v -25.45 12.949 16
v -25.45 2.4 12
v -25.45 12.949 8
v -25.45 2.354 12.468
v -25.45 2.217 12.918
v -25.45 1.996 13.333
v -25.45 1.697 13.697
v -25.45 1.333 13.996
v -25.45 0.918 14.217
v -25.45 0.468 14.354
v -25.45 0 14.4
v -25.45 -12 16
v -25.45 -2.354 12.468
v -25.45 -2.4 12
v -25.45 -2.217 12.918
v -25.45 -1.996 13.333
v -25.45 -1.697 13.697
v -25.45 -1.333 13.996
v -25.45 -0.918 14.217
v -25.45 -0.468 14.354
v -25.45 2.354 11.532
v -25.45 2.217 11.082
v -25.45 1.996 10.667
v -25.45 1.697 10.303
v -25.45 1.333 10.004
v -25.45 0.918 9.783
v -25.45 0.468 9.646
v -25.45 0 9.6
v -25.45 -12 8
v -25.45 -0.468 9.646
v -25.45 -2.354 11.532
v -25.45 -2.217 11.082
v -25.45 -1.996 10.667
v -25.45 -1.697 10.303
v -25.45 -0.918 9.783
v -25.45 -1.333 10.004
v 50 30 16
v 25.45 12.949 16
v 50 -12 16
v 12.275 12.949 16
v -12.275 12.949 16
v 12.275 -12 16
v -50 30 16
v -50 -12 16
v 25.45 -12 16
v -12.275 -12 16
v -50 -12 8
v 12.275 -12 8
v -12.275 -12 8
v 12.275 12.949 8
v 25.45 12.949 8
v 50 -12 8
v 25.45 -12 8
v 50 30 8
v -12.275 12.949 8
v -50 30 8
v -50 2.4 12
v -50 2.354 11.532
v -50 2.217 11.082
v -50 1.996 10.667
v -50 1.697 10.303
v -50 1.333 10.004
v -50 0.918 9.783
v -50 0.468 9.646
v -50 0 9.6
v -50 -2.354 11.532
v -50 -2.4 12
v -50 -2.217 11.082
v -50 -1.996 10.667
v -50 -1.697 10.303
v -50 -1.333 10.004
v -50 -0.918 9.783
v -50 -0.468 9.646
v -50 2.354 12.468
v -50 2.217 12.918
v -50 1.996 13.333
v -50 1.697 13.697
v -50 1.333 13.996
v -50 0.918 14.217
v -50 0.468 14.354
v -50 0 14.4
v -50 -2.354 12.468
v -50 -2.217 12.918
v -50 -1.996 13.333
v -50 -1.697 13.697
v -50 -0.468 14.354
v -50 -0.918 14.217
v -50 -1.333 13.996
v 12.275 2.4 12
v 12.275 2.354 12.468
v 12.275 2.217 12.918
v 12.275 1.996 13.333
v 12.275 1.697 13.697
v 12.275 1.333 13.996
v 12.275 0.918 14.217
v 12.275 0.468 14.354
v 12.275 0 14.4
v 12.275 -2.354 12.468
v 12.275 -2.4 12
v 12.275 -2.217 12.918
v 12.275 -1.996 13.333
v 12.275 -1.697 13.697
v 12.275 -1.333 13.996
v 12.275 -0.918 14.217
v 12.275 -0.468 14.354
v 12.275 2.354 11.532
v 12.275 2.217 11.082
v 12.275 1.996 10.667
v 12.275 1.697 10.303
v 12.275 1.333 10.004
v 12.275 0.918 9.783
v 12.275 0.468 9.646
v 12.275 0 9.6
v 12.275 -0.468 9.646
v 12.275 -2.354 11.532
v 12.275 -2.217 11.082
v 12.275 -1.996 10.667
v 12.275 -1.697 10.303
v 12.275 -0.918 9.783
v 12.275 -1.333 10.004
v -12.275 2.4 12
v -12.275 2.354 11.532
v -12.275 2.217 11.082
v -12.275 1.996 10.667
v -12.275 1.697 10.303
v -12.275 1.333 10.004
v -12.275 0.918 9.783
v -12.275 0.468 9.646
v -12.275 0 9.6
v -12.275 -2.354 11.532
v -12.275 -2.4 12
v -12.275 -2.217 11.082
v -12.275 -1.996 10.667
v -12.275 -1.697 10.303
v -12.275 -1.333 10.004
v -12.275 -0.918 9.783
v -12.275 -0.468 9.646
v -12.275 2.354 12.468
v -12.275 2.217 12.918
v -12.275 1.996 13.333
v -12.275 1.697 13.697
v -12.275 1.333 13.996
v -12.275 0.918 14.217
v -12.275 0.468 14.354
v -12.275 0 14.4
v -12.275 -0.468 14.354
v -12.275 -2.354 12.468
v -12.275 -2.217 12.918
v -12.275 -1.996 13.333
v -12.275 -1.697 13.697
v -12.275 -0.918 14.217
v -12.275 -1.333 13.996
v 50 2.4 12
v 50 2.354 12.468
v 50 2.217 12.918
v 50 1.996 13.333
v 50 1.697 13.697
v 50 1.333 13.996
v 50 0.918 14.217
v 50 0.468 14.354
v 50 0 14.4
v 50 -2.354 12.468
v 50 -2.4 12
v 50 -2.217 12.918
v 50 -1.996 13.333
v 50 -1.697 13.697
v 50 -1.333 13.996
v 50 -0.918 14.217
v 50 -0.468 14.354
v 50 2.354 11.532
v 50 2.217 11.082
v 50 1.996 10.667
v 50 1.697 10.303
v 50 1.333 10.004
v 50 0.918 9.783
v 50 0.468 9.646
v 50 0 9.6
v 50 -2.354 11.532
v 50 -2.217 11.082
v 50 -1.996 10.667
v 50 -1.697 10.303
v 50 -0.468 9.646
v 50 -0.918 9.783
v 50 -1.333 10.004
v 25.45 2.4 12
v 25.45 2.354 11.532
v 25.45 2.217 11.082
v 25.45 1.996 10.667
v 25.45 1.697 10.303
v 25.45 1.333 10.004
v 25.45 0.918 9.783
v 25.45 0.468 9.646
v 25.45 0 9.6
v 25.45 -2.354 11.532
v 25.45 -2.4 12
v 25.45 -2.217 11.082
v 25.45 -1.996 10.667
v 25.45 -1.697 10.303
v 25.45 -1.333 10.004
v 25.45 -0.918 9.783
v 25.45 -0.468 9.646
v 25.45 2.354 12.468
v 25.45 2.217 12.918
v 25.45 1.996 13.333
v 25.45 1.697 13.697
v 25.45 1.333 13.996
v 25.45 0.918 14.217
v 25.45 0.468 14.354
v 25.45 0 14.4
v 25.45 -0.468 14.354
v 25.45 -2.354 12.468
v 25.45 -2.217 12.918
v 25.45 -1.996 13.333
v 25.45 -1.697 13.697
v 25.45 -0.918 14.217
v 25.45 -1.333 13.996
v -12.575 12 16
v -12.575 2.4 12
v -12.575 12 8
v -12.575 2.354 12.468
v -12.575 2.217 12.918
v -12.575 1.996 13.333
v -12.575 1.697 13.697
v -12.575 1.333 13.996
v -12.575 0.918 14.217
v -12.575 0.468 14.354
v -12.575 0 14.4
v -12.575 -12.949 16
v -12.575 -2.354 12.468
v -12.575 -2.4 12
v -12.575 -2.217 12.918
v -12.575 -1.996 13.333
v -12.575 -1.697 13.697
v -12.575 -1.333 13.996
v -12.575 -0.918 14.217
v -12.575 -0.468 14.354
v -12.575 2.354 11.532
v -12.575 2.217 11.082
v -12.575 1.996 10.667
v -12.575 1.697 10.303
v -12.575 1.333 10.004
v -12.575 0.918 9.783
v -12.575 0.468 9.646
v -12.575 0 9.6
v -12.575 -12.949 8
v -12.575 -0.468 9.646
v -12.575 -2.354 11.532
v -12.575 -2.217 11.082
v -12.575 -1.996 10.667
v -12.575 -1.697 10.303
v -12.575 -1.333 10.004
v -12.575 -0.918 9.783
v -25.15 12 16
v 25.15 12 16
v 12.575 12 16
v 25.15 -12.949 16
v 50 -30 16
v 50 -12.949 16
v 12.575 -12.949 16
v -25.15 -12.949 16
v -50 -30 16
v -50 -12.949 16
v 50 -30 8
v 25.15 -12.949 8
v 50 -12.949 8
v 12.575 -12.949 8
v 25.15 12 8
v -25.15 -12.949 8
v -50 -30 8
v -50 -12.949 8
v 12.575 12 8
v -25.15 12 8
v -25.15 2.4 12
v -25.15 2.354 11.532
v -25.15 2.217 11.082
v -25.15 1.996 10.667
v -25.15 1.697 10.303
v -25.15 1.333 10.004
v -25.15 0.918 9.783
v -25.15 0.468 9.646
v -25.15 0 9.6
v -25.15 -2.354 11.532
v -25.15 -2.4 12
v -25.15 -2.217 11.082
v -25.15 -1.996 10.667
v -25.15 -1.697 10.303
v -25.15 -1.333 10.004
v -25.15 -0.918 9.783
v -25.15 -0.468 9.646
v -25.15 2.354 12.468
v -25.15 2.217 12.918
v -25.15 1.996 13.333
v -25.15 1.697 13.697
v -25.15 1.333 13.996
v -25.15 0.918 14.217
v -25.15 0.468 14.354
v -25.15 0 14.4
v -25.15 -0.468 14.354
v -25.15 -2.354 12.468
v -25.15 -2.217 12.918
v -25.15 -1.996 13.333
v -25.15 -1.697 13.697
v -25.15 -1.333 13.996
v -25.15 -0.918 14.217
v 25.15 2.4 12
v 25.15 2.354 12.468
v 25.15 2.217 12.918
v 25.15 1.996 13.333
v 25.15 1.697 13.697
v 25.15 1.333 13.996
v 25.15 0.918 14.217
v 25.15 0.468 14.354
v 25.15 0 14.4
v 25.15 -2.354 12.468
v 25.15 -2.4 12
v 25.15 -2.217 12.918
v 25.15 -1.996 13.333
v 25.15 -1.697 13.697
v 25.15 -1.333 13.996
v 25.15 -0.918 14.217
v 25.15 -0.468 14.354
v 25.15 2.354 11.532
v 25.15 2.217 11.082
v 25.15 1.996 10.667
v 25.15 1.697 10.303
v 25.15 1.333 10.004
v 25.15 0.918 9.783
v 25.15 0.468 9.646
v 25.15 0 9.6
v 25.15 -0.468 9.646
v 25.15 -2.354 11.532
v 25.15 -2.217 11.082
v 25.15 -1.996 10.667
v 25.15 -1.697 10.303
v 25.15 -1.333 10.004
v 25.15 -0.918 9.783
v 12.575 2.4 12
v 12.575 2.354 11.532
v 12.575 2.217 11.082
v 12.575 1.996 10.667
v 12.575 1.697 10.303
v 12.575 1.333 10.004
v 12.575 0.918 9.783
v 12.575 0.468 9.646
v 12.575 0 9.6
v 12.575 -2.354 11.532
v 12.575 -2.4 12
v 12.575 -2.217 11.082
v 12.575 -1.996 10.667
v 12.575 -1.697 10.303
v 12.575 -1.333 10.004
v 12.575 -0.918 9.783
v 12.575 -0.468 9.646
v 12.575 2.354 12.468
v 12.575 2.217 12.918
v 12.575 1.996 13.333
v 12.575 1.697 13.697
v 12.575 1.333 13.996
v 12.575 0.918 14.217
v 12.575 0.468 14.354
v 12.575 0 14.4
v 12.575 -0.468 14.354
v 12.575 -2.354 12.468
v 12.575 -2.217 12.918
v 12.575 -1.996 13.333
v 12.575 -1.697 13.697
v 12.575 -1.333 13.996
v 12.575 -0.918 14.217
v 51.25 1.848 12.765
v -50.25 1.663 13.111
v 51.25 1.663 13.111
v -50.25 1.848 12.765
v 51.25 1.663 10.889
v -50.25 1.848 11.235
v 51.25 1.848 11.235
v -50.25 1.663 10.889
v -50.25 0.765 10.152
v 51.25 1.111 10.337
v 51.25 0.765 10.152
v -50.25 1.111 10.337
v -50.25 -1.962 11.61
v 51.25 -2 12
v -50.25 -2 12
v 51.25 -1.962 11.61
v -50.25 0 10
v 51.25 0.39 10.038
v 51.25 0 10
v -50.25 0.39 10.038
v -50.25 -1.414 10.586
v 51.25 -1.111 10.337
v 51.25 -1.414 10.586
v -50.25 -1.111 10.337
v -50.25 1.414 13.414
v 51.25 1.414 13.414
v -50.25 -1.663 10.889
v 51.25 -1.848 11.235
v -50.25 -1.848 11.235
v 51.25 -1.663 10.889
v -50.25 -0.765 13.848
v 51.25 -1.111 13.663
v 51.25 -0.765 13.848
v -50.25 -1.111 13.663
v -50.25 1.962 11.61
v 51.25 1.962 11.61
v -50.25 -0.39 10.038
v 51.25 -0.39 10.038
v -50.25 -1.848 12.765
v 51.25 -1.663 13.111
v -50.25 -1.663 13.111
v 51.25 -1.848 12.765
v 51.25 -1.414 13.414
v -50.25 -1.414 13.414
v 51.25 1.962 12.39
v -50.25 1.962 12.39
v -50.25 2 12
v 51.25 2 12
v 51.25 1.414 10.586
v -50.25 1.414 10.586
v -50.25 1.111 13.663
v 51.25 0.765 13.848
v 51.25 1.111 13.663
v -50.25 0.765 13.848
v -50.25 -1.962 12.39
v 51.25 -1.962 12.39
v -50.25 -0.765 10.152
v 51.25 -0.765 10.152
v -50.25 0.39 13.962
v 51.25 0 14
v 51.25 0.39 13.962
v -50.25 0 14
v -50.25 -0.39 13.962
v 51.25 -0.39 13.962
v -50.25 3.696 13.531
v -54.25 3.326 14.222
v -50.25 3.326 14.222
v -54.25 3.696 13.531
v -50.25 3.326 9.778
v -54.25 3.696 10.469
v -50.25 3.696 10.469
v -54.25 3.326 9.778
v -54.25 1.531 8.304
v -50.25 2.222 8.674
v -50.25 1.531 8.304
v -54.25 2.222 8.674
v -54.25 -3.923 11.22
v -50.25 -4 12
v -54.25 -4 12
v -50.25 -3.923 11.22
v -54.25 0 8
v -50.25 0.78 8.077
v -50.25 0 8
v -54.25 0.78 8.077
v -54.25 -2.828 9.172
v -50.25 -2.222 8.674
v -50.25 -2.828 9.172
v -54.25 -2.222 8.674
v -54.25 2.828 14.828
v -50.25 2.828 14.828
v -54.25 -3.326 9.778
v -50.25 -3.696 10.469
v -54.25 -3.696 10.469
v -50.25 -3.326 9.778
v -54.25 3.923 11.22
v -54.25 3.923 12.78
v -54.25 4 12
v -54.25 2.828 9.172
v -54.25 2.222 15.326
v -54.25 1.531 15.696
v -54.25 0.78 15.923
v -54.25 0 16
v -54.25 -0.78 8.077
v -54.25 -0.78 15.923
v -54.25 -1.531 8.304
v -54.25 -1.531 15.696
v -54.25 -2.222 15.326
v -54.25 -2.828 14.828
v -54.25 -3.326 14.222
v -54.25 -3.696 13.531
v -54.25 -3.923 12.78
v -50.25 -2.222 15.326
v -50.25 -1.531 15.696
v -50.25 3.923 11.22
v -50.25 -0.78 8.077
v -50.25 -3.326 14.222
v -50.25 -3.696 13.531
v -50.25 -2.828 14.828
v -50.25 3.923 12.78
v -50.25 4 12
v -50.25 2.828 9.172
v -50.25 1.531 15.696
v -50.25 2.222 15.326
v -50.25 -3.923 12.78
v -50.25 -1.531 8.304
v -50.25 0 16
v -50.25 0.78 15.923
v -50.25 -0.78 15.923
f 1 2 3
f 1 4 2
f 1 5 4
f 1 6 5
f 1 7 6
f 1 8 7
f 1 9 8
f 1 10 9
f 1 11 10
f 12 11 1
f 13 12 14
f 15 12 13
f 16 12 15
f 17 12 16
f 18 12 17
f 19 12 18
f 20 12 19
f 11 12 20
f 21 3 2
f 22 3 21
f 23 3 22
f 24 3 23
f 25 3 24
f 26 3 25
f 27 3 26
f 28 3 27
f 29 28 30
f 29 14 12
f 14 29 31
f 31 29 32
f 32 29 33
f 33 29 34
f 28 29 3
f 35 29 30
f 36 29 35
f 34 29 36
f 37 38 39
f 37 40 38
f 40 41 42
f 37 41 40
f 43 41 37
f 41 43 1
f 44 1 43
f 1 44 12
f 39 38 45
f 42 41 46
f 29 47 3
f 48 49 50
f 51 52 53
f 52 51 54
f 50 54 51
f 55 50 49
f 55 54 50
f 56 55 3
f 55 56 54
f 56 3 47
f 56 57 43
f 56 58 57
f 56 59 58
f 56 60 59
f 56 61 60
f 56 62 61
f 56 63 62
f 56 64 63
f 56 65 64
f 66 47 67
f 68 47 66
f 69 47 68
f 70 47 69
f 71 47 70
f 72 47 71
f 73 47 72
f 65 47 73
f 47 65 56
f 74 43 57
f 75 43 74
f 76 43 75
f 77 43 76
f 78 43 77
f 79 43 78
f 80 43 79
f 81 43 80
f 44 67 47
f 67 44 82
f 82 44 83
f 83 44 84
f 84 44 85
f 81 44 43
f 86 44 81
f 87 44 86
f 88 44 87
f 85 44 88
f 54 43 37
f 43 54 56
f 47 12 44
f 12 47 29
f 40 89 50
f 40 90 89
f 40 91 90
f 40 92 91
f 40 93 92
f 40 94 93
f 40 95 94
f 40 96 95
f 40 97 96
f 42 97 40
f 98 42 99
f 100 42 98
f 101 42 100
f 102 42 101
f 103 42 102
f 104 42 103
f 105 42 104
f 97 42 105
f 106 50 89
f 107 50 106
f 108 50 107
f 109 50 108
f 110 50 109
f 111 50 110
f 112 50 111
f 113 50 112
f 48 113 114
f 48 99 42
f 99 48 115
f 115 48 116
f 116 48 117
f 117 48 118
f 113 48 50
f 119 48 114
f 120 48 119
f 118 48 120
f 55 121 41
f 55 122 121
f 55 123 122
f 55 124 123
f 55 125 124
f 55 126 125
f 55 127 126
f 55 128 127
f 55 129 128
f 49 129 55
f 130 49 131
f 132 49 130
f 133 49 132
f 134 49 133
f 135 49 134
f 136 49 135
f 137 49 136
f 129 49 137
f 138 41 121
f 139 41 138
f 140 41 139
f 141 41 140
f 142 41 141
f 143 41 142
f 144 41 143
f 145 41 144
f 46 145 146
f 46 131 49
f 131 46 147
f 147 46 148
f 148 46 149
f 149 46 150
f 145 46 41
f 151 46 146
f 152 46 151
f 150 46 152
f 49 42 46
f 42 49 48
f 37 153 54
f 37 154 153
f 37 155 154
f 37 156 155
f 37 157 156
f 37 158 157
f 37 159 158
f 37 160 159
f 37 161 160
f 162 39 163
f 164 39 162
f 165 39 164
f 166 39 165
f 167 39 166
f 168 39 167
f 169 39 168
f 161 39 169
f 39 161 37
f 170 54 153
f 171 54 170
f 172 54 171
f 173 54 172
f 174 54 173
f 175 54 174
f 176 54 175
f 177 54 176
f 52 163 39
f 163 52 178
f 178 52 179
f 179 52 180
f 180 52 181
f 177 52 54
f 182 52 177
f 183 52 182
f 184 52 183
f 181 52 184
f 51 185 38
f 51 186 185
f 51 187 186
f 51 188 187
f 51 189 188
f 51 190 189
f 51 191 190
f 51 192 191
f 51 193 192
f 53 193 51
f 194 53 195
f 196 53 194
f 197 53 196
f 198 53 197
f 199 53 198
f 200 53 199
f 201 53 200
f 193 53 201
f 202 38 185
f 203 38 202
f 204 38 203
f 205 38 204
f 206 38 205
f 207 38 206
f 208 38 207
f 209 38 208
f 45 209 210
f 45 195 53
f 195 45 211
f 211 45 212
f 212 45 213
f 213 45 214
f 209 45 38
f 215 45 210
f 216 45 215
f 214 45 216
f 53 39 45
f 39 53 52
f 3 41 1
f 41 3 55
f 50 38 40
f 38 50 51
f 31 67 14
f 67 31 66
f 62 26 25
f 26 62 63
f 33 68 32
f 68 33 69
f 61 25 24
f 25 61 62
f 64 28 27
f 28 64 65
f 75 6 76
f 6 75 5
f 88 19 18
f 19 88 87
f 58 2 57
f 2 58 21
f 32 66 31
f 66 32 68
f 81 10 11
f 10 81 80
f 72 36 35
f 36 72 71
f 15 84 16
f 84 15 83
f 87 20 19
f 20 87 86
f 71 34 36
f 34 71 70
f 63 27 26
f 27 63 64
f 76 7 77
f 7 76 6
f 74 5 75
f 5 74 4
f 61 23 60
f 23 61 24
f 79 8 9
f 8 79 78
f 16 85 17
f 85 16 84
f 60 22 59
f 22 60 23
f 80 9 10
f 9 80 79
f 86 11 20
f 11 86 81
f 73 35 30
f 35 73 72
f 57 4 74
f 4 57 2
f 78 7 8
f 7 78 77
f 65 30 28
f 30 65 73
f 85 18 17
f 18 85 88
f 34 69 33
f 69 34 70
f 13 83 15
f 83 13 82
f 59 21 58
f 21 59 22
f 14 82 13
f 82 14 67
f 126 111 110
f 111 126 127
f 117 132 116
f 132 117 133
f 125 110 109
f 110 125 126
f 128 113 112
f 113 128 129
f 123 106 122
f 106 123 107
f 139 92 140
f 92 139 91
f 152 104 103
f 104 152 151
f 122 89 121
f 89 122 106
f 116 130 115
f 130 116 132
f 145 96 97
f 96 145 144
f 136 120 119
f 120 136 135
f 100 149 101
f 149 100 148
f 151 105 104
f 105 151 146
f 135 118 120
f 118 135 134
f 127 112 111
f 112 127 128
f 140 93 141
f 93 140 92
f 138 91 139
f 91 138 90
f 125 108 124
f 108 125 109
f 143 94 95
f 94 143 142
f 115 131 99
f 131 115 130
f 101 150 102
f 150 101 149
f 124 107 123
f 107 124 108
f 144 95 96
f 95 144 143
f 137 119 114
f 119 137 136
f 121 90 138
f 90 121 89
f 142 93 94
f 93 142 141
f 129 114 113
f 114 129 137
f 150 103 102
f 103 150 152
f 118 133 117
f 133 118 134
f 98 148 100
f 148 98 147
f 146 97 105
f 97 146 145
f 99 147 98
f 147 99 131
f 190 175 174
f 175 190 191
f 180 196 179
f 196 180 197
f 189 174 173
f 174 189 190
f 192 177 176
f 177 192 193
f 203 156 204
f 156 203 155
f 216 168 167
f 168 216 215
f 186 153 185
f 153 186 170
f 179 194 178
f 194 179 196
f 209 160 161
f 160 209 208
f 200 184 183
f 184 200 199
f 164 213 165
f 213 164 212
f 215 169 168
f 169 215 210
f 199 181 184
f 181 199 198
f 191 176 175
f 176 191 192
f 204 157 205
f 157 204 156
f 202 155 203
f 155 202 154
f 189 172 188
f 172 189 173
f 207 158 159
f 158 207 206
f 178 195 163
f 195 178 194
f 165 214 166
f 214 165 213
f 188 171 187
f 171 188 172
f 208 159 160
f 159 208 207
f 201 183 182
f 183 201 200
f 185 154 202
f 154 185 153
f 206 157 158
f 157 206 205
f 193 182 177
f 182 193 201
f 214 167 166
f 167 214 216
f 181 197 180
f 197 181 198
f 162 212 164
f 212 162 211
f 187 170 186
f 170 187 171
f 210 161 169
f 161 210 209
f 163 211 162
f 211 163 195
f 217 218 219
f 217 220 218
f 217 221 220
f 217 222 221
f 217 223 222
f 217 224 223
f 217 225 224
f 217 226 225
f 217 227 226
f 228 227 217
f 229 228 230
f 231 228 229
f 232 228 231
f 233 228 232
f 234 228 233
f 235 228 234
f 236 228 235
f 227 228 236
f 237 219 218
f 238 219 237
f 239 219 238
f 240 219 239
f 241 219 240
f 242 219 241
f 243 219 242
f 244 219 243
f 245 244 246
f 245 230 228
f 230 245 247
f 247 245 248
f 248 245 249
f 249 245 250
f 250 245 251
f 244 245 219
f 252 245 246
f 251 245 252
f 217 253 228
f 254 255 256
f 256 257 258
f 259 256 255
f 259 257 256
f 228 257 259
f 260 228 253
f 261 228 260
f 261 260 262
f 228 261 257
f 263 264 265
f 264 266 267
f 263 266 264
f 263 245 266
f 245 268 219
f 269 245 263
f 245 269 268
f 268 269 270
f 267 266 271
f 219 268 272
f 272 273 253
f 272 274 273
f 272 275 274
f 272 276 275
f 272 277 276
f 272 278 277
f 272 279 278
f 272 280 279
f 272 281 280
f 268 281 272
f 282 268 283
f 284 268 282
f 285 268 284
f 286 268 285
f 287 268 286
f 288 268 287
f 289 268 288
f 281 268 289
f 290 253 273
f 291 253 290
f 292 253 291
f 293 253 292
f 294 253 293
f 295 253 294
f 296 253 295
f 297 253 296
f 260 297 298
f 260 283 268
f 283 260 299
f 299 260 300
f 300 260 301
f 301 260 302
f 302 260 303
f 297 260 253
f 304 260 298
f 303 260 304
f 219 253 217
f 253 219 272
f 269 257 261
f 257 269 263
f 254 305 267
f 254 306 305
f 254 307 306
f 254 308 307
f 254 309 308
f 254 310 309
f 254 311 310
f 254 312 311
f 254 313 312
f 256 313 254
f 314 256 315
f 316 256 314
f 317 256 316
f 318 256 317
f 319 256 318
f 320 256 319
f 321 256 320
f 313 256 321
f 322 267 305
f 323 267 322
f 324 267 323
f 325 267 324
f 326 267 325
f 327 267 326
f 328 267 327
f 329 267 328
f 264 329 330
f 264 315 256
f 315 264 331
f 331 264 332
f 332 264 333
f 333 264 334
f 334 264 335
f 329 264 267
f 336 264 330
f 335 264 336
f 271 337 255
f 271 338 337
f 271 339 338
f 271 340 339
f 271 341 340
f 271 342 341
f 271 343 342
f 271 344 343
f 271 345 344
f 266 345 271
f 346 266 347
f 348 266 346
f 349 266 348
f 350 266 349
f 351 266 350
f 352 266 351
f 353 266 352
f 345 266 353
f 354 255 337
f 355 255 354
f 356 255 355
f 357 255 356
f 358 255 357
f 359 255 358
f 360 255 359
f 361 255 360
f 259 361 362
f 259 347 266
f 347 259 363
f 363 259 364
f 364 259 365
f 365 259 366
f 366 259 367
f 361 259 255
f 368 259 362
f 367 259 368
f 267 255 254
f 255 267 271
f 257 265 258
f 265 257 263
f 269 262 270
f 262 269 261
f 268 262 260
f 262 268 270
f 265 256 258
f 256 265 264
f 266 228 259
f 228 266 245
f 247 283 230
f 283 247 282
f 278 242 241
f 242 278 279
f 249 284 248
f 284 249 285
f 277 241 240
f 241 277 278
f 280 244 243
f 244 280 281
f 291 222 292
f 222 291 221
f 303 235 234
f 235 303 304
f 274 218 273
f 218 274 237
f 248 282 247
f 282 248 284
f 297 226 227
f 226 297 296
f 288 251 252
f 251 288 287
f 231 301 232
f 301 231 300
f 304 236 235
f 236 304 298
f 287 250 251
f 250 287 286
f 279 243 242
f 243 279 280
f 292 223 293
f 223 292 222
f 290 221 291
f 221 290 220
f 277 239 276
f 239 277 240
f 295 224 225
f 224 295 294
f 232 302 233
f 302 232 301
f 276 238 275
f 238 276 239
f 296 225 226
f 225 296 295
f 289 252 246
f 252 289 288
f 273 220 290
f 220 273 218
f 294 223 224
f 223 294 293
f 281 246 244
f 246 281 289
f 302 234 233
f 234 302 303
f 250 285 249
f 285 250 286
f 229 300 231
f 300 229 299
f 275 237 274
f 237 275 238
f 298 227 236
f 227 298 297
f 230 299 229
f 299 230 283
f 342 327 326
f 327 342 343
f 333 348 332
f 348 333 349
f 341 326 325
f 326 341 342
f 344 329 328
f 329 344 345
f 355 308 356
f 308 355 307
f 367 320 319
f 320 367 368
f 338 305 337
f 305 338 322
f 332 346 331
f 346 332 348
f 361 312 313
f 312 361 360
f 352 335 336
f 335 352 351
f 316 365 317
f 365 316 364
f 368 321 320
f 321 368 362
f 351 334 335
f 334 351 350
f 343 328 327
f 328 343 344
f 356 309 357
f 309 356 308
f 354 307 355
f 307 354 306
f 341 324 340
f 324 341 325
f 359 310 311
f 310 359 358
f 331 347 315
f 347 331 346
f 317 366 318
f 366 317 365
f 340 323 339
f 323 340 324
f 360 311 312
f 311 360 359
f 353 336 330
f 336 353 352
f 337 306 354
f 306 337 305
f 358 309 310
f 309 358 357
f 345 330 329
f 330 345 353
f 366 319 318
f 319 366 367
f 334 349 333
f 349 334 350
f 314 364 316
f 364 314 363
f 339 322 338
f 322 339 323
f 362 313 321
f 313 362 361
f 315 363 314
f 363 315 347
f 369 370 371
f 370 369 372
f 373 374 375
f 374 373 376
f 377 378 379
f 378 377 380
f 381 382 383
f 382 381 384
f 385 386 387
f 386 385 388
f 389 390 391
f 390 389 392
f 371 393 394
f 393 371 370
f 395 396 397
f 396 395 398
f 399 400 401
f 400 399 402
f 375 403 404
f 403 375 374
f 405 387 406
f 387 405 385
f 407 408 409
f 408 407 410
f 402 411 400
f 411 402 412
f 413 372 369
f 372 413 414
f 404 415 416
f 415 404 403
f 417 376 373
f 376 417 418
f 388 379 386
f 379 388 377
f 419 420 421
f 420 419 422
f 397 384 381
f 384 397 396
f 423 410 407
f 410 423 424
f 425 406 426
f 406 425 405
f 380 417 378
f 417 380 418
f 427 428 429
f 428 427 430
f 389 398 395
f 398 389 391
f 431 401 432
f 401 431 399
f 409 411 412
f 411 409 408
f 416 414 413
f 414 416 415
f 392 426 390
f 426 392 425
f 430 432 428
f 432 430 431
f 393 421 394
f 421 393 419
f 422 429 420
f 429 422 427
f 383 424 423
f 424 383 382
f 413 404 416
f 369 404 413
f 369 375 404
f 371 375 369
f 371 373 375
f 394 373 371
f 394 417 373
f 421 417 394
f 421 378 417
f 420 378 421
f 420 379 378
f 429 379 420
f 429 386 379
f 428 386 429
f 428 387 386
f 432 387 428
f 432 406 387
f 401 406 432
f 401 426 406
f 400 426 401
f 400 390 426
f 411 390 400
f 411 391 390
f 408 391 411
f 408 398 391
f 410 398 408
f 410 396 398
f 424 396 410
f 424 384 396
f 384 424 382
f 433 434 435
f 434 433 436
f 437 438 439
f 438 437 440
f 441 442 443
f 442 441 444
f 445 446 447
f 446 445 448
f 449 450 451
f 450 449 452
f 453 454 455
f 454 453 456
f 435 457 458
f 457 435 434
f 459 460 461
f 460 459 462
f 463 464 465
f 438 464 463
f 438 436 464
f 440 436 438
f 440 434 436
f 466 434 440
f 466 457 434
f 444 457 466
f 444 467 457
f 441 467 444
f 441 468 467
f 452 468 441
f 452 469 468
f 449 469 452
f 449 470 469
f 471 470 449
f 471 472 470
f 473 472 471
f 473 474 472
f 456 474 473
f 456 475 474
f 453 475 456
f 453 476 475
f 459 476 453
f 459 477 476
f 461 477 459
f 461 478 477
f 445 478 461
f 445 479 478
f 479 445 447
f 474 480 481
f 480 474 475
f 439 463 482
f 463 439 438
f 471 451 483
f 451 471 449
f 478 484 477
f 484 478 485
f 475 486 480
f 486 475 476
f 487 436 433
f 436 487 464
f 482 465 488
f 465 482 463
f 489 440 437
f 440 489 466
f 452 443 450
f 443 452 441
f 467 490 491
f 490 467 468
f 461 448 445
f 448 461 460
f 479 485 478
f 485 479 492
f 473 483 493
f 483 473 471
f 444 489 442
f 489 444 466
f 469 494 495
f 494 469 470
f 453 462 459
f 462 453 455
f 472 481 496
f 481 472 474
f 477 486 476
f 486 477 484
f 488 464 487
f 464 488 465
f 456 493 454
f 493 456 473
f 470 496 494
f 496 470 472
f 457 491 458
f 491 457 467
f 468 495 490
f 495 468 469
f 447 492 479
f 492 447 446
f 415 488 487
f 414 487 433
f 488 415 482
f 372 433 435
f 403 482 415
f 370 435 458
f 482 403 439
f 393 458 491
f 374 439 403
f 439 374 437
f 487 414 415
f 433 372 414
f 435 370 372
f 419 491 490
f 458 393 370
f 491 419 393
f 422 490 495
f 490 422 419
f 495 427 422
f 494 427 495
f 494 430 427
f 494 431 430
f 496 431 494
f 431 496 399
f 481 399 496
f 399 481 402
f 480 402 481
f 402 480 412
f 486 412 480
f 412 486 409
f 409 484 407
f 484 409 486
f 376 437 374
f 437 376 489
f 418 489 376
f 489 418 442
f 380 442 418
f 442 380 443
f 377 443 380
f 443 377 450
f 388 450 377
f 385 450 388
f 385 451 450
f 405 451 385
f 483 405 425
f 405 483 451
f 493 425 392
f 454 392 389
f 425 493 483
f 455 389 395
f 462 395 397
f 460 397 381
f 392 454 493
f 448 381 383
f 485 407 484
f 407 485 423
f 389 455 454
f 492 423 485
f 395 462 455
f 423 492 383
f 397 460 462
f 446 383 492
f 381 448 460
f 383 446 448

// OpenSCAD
$fn = 32;

// ------------------------------------------------------------------------
// Butt hinge: hinge 100 mm, leaf swung 0 deg
// Every part is its own module, assembly() places every instance.
// ------------------------------------------------------------------------

// --- part 1 ---
module hinge_base() {
  difference() {
    union() {
      translate([-50, -12, -4]) cube([24.55, 42, 8]);
      translate([-12.275, -12, -4]) cube([24.55, 42, 8]);
      translate([25.45, -12, -4]) cube([24.55, 42, 8]);
      translate([-50, 12.949, -4]) cube([100, 17.051, 8]);
    }
    translate([-37.725, 0, 0]) rotate([0, 90, 0]) cylinder(h = 26.55, d = 4.8, center = true);
    translate([0, 0, 0]) rotate([0, 90, 0]) cylinder(h = 26.55, d = 4.8, center = true);
    translate([37.725, 0, 0]) rotate([0, 90, 0]) cylinder(h = 26.55, d = 4.8, center = true);
  }
}

// --- part 2 ---
module hinge_mover() {
  difference() {
    union() {
      translate([-25.15, -30, -4]) cube([12.575, 42, 8]);
      translate([12.575, -30, -4]) cube([12.575, 42, 8]);
      translate([-50, -30, -4]) cube([100, 17.051, 8]);
    }
    translate([-18.863, 0, 0]) rotate([0, 90, 0]) cylinder(h = 14.575, d = 4.8, center = true);
    translate([18.863, 0, 0]) rotate([0, 90, 0]) cylinder(h = 14.575, d = 4.8, center = true);
  }
}

// --- part 3 ---
module hinge_pin() {
  rotate([0, 90, 0]) cylinder(h = 102.5, d = 4, center = true);
  translate([-54.25, 0, 0]) rotate([0, 90, 0]) cylinder(h = 4, d = 8);
}

// --- assembly ---
module assembly() {
  color([0.80, 0.24, 0.20]) translate([0, 0, 12]) rotate([0, 0, 0]) hinge_base();
  color([0.20, 0.45, 0.75]) translate([0, 0, 12]) rotate([0, 0, 0]) hinge_mover();
  color([0.25, 0.62, 0.32]) translate([0, 0, 12]) rotate([0, 0, 0]) hinge_pin();
}

assembly();
